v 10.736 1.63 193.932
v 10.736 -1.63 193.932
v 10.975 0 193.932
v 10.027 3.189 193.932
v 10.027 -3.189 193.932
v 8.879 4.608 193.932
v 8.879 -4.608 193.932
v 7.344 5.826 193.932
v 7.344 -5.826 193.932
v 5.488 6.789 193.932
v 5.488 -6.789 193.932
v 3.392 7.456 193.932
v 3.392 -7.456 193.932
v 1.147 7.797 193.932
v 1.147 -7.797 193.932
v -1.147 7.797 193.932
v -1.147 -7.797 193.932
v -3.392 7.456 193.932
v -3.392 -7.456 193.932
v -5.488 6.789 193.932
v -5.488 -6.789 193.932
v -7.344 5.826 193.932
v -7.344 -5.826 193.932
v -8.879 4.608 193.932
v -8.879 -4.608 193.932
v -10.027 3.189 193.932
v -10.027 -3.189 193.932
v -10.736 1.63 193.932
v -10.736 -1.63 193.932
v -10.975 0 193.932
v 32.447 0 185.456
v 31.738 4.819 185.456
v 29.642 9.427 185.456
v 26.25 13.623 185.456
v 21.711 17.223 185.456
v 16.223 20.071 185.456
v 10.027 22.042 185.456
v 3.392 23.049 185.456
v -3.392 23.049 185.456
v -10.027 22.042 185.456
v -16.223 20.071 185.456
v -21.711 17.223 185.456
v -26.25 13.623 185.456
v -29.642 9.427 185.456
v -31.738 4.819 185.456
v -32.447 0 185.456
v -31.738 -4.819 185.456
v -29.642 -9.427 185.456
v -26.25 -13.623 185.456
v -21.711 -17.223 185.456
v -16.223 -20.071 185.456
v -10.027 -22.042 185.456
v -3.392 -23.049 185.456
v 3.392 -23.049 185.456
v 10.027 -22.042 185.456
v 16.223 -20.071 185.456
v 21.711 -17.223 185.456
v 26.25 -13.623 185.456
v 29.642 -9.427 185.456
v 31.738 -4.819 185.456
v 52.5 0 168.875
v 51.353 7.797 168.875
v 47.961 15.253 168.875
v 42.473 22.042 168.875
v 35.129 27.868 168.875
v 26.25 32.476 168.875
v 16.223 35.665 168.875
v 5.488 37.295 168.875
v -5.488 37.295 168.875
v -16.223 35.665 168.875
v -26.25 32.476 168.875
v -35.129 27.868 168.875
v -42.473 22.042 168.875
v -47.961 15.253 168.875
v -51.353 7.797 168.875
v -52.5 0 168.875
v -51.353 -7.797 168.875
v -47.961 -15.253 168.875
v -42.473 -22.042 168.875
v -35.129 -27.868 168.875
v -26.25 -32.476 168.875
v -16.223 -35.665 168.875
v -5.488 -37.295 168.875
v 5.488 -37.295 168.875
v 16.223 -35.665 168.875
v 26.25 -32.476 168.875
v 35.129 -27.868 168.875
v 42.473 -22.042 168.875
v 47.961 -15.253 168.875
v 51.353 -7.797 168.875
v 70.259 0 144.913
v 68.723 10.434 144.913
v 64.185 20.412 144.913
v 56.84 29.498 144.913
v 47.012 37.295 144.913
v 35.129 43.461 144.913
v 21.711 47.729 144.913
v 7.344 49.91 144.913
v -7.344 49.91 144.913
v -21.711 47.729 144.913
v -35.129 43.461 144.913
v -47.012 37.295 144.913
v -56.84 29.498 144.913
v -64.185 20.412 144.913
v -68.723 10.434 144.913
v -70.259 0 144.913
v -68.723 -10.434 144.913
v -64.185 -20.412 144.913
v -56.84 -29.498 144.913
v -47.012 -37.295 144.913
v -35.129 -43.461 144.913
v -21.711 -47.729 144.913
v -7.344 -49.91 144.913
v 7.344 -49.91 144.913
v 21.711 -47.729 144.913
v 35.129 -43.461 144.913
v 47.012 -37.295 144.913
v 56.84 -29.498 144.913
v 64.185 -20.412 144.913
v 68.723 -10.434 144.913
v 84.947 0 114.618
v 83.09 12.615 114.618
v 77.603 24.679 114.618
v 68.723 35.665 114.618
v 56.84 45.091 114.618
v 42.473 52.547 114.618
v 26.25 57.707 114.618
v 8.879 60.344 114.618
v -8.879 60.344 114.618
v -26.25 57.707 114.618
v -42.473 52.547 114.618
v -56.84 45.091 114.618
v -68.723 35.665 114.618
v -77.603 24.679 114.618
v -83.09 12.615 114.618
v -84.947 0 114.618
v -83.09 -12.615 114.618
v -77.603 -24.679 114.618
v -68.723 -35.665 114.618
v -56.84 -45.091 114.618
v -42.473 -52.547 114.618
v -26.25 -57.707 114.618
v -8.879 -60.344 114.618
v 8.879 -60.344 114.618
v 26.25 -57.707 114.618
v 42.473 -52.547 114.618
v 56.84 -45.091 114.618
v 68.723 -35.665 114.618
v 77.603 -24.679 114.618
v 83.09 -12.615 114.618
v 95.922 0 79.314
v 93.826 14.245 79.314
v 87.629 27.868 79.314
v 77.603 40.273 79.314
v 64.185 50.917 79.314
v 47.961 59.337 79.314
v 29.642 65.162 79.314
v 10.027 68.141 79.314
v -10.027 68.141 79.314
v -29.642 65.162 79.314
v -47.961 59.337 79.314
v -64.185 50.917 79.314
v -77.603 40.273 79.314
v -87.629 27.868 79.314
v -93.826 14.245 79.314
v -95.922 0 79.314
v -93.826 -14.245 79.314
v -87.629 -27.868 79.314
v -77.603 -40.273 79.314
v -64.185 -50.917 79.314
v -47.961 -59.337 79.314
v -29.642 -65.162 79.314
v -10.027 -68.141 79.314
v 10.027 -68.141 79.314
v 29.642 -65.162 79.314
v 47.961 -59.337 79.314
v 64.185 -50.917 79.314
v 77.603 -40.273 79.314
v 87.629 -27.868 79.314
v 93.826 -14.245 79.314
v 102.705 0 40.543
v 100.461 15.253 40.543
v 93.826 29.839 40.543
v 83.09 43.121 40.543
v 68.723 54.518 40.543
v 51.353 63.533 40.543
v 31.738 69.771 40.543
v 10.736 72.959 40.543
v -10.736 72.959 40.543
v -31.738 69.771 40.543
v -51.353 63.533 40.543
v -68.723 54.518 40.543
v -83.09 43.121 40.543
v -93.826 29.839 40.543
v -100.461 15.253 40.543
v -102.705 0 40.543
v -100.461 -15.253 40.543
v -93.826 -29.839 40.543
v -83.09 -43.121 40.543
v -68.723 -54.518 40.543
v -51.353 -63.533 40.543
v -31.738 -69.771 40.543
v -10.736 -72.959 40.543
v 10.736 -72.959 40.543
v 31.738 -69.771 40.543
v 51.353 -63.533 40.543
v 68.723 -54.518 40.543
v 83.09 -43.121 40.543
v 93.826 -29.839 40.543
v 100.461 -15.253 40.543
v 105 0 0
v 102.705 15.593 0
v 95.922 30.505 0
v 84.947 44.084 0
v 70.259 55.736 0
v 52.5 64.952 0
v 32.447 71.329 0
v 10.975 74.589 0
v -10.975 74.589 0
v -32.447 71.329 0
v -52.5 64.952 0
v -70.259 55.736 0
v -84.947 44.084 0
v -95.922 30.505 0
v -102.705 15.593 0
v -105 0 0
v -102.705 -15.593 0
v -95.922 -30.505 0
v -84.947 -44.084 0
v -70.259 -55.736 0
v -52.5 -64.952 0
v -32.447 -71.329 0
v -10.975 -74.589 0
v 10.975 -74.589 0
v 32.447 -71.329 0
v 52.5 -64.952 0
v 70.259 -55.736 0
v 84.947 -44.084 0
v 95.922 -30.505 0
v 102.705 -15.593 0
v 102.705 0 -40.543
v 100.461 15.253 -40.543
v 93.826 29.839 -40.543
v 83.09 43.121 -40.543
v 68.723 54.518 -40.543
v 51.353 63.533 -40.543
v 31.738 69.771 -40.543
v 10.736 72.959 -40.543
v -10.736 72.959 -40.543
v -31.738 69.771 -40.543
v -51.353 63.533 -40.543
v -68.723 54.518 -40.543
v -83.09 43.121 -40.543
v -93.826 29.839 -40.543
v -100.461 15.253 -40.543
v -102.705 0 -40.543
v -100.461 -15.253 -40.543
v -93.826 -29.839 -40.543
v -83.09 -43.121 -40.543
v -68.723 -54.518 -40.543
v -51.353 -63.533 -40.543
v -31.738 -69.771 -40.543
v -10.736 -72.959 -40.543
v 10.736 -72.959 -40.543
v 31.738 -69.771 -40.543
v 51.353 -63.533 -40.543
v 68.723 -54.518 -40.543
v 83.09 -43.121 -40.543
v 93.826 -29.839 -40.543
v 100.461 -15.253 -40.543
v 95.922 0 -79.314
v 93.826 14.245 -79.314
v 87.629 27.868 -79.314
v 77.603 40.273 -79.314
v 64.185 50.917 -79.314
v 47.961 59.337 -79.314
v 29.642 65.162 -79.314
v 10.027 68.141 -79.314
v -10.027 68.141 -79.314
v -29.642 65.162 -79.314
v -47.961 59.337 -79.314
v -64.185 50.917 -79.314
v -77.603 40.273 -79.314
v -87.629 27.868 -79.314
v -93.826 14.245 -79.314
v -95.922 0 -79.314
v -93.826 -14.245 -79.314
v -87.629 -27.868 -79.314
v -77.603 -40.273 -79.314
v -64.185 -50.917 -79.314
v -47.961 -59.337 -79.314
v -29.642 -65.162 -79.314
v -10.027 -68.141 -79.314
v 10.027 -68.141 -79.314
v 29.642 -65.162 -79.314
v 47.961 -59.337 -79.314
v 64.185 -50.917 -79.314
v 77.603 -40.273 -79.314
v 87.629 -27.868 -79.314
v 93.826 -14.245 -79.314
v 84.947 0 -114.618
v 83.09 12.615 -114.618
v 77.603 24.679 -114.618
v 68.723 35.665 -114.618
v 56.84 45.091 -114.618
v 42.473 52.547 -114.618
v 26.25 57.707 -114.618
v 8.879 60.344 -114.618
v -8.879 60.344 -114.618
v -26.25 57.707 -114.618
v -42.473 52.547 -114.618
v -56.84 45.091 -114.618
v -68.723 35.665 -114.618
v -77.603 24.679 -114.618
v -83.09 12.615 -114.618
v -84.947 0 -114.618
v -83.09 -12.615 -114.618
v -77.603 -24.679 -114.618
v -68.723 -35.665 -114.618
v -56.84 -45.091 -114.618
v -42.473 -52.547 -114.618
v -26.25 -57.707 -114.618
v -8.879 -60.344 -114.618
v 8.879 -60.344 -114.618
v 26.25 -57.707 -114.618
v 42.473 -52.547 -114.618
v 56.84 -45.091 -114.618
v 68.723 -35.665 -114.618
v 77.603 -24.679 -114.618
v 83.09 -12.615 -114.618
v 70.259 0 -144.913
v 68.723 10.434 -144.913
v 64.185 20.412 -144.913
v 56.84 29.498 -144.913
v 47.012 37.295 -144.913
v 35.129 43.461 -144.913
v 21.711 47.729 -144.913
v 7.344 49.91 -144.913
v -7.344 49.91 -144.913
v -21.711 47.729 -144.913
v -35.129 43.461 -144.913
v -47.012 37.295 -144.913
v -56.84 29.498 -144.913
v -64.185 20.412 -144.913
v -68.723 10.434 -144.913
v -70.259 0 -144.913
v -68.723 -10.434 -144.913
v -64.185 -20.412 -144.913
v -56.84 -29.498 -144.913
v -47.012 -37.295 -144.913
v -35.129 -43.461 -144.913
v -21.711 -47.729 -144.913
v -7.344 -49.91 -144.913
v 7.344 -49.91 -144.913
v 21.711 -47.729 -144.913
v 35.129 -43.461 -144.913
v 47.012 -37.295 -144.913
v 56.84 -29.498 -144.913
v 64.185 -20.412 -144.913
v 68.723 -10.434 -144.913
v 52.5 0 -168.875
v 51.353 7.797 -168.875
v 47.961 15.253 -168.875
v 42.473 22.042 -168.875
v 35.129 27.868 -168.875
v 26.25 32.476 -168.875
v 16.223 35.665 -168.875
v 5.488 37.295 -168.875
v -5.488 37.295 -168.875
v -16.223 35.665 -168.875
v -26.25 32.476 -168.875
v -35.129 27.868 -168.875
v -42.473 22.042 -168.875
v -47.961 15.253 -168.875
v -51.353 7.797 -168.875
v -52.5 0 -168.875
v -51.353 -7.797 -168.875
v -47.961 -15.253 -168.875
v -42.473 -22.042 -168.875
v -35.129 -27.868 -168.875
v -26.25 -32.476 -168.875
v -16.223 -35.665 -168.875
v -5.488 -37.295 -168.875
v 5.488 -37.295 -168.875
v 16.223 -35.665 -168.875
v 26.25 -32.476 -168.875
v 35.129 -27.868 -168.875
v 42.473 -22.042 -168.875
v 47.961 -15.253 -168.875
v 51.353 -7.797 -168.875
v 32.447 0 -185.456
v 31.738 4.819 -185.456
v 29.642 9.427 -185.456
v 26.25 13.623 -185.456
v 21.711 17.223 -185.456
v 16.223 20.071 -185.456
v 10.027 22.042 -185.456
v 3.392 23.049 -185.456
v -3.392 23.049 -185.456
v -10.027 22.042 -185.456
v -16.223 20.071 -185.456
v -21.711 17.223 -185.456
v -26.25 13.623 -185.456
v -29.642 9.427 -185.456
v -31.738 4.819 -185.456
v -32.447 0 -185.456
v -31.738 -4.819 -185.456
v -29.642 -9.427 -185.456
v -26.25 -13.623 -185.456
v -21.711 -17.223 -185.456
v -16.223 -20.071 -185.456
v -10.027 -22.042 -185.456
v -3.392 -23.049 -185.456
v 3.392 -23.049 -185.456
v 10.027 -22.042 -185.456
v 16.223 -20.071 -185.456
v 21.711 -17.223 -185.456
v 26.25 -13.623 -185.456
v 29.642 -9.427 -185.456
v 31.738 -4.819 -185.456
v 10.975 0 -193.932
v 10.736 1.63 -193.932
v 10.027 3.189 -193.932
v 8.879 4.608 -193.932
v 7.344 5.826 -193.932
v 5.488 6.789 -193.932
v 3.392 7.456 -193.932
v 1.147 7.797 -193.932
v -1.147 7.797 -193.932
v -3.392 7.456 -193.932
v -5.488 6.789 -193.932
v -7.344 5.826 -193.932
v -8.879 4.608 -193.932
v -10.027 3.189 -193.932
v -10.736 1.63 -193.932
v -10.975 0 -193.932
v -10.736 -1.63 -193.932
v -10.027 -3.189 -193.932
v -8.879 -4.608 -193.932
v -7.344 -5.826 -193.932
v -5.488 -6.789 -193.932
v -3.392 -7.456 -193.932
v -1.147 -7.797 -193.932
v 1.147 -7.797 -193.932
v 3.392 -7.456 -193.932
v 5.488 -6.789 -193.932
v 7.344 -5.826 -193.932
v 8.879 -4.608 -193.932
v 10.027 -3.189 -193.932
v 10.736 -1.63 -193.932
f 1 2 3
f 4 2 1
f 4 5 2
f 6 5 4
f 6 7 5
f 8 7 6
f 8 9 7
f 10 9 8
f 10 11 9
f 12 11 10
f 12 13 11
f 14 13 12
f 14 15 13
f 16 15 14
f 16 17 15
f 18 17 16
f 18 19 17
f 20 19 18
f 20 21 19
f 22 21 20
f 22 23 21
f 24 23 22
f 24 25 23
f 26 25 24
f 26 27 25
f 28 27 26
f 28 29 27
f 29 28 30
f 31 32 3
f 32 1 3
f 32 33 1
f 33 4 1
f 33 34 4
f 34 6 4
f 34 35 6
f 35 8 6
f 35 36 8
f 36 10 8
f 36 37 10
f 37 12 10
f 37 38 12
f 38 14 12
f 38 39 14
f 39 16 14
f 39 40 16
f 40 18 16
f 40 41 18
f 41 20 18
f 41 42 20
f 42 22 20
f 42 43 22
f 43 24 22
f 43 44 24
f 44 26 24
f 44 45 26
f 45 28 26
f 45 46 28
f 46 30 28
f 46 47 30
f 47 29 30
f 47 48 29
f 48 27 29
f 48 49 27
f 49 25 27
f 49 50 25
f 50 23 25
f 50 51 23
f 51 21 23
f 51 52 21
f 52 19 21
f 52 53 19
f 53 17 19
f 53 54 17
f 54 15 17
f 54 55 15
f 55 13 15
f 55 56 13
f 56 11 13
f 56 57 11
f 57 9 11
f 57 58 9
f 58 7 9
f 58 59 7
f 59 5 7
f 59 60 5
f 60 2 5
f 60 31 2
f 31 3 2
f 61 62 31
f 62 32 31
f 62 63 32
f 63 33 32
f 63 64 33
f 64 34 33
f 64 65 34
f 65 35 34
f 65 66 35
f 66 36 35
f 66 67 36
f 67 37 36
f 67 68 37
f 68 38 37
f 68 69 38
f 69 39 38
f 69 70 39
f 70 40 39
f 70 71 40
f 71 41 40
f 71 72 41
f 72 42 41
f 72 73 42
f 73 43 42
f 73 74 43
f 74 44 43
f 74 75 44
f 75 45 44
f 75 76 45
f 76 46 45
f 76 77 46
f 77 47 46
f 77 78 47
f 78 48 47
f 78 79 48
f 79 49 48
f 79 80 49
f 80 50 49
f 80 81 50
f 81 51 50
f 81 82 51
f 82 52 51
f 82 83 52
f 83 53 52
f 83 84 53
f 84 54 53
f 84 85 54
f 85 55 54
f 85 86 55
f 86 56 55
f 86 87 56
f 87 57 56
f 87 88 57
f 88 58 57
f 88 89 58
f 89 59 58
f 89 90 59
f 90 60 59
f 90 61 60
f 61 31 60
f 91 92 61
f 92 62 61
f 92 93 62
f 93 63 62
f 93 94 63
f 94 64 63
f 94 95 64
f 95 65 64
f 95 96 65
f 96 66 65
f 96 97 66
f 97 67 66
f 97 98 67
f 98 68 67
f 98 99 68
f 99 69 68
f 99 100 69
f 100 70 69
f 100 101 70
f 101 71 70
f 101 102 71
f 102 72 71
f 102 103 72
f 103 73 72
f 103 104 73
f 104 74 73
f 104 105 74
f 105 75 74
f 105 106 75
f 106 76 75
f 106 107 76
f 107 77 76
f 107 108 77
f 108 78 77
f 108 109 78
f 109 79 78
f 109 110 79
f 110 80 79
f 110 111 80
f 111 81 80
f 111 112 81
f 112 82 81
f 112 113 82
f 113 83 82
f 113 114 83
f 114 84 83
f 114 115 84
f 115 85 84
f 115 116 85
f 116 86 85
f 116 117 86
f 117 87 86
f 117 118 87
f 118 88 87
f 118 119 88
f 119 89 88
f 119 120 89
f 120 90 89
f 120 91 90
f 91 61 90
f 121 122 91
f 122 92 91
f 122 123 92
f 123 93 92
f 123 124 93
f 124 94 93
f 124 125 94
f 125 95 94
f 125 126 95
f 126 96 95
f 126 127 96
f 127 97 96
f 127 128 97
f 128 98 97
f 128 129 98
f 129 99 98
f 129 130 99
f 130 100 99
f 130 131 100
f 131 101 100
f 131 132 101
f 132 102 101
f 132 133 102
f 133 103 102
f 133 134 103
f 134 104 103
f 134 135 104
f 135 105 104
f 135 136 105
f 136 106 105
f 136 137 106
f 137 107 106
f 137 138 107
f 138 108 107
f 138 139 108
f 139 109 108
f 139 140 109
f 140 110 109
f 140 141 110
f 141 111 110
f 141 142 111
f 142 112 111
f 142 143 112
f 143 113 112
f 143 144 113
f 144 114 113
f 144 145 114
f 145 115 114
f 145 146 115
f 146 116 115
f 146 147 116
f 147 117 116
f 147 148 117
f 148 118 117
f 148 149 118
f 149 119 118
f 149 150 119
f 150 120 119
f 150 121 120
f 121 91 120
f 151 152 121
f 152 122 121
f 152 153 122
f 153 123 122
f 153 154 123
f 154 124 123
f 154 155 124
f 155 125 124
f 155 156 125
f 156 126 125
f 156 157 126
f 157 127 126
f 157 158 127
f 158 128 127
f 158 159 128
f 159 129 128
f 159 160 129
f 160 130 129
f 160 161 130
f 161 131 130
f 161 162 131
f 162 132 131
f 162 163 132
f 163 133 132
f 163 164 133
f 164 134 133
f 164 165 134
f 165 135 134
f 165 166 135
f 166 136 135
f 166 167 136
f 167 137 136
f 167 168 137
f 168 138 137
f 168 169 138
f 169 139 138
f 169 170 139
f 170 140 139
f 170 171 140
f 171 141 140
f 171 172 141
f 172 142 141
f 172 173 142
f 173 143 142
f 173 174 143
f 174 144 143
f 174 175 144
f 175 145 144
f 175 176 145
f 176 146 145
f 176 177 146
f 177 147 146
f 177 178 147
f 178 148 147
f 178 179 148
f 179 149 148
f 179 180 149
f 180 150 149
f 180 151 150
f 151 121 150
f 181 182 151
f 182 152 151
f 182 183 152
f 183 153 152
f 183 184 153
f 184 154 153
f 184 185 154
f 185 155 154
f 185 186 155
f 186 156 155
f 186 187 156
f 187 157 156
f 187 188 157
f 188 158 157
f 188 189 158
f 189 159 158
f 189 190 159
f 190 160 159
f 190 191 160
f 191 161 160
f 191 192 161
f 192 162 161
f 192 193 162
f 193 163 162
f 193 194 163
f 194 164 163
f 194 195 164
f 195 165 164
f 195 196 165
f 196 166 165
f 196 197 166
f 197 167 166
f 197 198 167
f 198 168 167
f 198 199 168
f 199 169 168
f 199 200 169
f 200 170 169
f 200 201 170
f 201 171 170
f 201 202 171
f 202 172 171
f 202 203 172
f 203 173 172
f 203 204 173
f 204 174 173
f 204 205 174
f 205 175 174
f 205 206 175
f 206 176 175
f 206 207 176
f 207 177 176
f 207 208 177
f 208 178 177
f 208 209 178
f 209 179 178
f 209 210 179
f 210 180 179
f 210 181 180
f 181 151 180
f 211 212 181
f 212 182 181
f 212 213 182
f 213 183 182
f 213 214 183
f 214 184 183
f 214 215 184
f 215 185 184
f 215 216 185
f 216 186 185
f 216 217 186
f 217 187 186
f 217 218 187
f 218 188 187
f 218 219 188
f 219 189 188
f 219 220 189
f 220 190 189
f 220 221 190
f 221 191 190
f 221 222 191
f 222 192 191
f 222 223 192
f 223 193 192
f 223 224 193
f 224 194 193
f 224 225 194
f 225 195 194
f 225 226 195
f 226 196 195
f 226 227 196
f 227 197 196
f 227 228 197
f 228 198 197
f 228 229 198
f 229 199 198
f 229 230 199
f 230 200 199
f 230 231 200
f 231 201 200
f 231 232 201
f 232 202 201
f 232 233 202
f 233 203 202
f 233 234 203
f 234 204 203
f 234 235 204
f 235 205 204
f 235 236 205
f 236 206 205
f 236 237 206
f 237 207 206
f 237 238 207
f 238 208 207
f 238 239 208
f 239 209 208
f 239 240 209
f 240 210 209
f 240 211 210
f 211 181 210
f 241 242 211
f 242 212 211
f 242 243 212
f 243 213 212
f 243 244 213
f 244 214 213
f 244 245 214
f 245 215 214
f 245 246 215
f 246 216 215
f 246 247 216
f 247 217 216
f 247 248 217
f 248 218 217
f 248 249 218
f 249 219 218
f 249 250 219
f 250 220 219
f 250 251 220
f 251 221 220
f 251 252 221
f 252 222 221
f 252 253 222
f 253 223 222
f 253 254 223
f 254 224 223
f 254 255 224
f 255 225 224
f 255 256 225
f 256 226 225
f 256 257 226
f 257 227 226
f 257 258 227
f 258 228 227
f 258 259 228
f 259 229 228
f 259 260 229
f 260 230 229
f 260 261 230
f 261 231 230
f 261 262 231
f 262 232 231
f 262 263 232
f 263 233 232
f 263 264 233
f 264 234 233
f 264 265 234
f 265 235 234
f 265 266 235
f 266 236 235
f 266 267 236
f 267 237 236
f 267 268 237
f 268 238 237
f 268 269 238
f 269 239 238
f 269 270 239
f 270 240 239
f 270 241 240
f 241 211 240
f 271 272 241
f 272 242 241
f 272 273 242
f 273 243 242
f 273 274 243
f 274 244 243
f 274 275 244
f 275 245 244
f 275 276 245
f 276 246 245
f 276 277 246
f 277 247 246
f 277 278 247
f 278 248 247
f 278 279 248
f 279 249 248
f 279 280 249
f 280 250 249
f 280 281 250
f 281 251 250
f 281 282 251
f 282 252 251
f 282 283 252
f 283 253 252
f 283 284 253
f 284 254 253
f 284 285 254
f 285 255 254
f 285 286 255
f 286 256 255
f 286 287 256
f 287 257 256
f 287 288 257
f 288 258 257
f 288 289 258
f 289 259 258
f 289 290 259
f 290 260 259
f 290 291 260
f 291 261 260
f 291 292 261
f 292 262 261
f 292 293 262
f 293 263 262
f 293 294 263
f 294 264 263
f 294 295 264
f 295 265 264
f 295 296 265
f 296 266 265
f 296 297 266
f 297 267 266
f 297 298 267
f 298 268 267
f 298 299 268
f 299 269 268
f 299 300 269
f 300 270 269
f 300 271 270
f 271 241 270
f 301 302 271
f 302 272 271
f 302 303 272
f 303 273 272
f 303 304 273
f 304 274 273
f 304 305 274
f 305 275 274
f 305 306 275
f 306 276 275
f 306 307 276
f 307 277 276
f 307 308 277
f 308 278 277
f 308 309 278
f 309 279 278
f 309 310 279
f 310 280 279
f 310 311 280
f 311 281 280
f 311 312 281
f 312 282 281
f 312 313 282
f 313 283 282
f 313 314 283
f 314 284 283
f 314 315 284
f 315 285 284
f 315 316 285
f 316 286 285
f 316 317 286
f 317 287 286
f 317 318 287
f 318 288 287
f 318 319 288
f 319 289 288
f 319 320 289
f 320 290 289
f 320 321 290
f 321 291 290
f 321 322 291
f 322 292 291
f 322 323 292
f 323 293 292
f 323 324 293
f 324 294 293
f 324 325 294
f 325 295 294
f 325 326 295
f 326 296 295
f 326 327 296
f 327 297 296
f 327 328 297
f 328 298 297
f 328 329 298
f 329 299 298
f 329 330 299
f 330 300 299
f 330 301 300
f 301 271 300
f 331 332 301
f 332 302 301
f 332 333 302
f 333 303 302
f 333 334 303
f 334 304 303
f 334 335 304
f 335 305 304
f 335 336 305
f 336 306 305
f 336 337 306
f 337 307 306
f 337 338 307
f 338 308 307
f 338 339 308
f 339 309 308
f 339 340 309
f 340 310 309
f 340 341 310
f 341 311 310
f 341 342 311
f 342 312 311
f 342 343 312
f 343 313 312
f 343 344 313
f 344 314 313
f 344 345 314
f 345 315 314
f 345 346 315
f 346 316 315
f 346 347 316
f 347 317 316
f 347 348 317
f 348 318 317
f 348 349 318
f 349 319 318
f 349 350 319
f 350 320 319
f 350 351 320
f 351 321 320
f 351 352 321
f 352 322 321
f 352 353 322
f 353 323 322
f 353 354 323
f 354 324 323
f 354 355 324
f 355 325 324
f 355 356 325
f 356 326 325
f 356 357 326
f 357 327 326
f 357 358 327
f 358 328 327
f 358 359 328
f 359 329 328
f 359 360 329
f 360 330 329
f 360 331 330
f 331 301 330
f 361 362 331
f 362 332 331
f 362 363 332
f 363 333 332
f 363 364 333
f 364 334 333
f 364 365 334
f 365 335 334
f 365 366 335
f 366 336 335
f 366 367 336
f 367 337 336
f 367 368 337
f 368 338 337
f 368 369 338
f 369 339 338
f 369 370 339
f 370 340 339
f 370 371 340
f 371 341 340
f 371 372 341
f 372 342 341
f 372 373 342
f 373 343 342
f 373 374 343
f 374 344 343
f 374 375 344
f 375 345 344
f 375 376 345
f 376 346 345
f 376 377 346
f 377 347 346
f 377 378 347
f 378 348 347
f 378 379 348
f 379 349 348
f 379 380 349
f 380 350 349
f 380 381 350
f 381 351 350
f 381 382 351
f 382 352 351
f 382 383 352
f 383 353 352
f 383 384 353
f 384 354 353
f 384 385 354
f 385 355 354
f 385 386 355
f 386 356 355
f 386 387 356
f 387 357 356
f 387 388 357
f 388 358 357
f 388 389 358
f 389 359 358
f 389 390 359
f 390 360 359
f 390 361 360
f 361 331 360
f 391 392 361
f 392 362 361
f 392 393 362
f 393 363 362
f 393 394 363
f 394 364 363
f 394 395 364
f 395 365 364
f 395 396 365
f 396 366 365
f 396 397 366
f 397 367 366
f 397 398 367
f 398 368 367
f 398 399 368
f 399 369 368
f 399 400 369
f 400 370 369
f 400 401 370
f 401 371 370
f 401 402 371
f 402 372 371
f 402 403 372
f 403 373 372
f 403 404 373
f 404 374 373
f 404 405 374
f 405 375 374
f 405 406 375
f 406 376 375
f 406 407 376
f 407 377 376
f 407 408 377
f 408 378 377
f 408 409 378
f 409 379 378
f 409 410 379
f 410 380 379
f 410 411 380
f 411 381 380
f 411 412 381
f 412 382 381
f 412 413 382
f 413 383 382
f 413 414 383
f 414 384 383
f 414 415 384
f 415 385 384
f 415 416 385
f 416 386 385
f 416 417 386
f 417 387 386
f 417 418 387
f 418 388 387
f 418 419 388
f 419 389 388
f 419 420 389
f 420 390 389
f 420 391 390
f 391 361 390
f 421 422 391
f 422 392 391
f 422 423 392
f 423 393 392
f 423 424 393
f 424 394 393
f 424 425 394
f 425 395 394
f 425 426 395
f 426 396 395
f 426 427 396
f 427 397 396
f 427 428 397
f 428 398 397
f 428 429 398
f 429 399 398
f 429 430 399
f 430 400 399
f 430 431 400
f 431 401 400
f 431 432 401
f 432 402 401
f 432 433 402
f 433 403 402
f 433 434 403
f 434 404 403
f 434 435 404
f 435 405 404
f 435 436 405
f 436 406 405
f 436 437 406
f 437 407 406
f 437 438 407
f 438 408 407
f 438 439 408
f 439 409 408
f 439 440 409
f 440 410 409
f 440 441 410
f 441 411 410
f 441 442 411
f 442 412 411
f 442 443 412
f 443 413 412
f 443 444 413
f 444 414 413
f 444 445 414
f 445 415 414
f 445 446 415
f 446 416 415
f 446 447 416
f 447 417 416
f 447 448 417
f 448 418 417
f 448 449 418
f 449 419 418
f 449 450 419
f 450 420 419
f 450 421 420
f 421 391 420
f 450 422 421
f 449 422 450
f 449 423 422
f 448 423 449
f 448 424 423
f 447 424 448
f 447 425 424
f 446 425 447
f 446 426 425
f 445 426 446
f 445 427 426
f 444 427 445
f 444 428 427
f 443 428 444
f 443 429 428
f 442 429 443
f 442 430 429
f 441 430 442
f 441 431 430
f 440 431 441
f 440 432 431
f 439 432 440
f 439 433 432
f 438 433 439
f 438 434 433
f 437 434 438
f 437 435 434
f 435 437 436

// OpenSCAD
// Generated by SolidPython 1.0.1 on 2020-07-29 00:46:47


scale(v = [7, 5, 13]) {
	sphere(r = 15);
}
/***********************************************
*********      SolidPython code:      **********
************************************************
 
# import packages: SolidPython
from solid import *
from solid.utils import *
from itertools import chain, combinations, permutations


class Resize:

    def __init__(self, scad_file):
        self.scad_file = scad_file
        #self.scad_file = import_scad(scad_file)
        # cone/cylinder param:
        self.r1 = 0
        self.r2 = 0
        self.h = 0
        # rectangular prism param:
        self.w = 0
        self.l = 0
        # ellipse param:
        self.r = 0

    # import OpenScad code (file name corresponds to shape)


    # classify shape + parameters
    def assign(self, param1, param2, param3):
        if self.scad_file == 'cone.scad':
            self.r1 = param1
            self.r2 = param2
            self.h = param3
        elif self.scad_file == 'cylinder.scad':
            self.r1 = param1
            self.r2 = param2
            self.h = param3
        elif self.scad_file == 'rectangularPrism.scad':
            self.h = param1
            self.l = param2
            self.w = param3
        else:
            self.r = param1
            self.h = param2

    # resize parameters
    def iterate(self):
        x = range(3, 20, 2)
        i = 1
        if self.scad_file == 'cone.scad':
            tempList = list(permutations(x, 2))
            for temp in tempList:
                param1 = temp[0]
                param2 = temp[1]
                filepath = 'produced_scad_files/' + 'cone' + str(param1) + '_' + str(param2) + '_' + '.scad'
                scad_render_to_file(cylinder(h=param1, r1=param2, r2=0), filepath)

        elif self.scad_file == 'cylinder.scad':
            tempList = list(permutations(x, 3))
            for temp in tempList:
                param1 = temp[0]
                param2 = temp[1]
                filepath = 'produced_scad_files/' + 'cylinder' + str(param1) + '_' + str(param2) + '_' + '.scad'
                scad_render_to_file(cylinder(h=param1, r1=param2, r2=param2), filepath)

        elif self.scad_file == 'rectangularPrism.scad':
            tempList = list(permutations(x, 3))
            for temp in tempList:
                param1 = temp[0]
                param2 = temp[1]
                param3 = temp[2]
                filepath = 'produced_scad_files/' + 'rectangularPrism' + str(param1) + '_' + str(param2) + '_' + str(
                    param3) + '.scad'
                scad_render_to_file(cube(size=(param1, param2, param3)), filepath)

        elif self.scad_file == 'ellipse.scad':
            tempList = list(permutations(x, 4))
            for temp in tempList:
                param1 = temp[0]
                param2 = temp[1]
                param3 = temp[2]
                param4 = temp[3]
                filepath = 'produced_scad_files/' + 'ellipse' + str(param1) + '_' + str(param2) + '_' + str(param3) + '_' + str(param4) + '.scad'
                scad_render_to_file(scale([param1, param2, param3])(sphere(r=param4)), filepath)

    def render_to_scadfile(self):
        scad_render_to_file(scad, 'example.scad') 
 
************************************************/
